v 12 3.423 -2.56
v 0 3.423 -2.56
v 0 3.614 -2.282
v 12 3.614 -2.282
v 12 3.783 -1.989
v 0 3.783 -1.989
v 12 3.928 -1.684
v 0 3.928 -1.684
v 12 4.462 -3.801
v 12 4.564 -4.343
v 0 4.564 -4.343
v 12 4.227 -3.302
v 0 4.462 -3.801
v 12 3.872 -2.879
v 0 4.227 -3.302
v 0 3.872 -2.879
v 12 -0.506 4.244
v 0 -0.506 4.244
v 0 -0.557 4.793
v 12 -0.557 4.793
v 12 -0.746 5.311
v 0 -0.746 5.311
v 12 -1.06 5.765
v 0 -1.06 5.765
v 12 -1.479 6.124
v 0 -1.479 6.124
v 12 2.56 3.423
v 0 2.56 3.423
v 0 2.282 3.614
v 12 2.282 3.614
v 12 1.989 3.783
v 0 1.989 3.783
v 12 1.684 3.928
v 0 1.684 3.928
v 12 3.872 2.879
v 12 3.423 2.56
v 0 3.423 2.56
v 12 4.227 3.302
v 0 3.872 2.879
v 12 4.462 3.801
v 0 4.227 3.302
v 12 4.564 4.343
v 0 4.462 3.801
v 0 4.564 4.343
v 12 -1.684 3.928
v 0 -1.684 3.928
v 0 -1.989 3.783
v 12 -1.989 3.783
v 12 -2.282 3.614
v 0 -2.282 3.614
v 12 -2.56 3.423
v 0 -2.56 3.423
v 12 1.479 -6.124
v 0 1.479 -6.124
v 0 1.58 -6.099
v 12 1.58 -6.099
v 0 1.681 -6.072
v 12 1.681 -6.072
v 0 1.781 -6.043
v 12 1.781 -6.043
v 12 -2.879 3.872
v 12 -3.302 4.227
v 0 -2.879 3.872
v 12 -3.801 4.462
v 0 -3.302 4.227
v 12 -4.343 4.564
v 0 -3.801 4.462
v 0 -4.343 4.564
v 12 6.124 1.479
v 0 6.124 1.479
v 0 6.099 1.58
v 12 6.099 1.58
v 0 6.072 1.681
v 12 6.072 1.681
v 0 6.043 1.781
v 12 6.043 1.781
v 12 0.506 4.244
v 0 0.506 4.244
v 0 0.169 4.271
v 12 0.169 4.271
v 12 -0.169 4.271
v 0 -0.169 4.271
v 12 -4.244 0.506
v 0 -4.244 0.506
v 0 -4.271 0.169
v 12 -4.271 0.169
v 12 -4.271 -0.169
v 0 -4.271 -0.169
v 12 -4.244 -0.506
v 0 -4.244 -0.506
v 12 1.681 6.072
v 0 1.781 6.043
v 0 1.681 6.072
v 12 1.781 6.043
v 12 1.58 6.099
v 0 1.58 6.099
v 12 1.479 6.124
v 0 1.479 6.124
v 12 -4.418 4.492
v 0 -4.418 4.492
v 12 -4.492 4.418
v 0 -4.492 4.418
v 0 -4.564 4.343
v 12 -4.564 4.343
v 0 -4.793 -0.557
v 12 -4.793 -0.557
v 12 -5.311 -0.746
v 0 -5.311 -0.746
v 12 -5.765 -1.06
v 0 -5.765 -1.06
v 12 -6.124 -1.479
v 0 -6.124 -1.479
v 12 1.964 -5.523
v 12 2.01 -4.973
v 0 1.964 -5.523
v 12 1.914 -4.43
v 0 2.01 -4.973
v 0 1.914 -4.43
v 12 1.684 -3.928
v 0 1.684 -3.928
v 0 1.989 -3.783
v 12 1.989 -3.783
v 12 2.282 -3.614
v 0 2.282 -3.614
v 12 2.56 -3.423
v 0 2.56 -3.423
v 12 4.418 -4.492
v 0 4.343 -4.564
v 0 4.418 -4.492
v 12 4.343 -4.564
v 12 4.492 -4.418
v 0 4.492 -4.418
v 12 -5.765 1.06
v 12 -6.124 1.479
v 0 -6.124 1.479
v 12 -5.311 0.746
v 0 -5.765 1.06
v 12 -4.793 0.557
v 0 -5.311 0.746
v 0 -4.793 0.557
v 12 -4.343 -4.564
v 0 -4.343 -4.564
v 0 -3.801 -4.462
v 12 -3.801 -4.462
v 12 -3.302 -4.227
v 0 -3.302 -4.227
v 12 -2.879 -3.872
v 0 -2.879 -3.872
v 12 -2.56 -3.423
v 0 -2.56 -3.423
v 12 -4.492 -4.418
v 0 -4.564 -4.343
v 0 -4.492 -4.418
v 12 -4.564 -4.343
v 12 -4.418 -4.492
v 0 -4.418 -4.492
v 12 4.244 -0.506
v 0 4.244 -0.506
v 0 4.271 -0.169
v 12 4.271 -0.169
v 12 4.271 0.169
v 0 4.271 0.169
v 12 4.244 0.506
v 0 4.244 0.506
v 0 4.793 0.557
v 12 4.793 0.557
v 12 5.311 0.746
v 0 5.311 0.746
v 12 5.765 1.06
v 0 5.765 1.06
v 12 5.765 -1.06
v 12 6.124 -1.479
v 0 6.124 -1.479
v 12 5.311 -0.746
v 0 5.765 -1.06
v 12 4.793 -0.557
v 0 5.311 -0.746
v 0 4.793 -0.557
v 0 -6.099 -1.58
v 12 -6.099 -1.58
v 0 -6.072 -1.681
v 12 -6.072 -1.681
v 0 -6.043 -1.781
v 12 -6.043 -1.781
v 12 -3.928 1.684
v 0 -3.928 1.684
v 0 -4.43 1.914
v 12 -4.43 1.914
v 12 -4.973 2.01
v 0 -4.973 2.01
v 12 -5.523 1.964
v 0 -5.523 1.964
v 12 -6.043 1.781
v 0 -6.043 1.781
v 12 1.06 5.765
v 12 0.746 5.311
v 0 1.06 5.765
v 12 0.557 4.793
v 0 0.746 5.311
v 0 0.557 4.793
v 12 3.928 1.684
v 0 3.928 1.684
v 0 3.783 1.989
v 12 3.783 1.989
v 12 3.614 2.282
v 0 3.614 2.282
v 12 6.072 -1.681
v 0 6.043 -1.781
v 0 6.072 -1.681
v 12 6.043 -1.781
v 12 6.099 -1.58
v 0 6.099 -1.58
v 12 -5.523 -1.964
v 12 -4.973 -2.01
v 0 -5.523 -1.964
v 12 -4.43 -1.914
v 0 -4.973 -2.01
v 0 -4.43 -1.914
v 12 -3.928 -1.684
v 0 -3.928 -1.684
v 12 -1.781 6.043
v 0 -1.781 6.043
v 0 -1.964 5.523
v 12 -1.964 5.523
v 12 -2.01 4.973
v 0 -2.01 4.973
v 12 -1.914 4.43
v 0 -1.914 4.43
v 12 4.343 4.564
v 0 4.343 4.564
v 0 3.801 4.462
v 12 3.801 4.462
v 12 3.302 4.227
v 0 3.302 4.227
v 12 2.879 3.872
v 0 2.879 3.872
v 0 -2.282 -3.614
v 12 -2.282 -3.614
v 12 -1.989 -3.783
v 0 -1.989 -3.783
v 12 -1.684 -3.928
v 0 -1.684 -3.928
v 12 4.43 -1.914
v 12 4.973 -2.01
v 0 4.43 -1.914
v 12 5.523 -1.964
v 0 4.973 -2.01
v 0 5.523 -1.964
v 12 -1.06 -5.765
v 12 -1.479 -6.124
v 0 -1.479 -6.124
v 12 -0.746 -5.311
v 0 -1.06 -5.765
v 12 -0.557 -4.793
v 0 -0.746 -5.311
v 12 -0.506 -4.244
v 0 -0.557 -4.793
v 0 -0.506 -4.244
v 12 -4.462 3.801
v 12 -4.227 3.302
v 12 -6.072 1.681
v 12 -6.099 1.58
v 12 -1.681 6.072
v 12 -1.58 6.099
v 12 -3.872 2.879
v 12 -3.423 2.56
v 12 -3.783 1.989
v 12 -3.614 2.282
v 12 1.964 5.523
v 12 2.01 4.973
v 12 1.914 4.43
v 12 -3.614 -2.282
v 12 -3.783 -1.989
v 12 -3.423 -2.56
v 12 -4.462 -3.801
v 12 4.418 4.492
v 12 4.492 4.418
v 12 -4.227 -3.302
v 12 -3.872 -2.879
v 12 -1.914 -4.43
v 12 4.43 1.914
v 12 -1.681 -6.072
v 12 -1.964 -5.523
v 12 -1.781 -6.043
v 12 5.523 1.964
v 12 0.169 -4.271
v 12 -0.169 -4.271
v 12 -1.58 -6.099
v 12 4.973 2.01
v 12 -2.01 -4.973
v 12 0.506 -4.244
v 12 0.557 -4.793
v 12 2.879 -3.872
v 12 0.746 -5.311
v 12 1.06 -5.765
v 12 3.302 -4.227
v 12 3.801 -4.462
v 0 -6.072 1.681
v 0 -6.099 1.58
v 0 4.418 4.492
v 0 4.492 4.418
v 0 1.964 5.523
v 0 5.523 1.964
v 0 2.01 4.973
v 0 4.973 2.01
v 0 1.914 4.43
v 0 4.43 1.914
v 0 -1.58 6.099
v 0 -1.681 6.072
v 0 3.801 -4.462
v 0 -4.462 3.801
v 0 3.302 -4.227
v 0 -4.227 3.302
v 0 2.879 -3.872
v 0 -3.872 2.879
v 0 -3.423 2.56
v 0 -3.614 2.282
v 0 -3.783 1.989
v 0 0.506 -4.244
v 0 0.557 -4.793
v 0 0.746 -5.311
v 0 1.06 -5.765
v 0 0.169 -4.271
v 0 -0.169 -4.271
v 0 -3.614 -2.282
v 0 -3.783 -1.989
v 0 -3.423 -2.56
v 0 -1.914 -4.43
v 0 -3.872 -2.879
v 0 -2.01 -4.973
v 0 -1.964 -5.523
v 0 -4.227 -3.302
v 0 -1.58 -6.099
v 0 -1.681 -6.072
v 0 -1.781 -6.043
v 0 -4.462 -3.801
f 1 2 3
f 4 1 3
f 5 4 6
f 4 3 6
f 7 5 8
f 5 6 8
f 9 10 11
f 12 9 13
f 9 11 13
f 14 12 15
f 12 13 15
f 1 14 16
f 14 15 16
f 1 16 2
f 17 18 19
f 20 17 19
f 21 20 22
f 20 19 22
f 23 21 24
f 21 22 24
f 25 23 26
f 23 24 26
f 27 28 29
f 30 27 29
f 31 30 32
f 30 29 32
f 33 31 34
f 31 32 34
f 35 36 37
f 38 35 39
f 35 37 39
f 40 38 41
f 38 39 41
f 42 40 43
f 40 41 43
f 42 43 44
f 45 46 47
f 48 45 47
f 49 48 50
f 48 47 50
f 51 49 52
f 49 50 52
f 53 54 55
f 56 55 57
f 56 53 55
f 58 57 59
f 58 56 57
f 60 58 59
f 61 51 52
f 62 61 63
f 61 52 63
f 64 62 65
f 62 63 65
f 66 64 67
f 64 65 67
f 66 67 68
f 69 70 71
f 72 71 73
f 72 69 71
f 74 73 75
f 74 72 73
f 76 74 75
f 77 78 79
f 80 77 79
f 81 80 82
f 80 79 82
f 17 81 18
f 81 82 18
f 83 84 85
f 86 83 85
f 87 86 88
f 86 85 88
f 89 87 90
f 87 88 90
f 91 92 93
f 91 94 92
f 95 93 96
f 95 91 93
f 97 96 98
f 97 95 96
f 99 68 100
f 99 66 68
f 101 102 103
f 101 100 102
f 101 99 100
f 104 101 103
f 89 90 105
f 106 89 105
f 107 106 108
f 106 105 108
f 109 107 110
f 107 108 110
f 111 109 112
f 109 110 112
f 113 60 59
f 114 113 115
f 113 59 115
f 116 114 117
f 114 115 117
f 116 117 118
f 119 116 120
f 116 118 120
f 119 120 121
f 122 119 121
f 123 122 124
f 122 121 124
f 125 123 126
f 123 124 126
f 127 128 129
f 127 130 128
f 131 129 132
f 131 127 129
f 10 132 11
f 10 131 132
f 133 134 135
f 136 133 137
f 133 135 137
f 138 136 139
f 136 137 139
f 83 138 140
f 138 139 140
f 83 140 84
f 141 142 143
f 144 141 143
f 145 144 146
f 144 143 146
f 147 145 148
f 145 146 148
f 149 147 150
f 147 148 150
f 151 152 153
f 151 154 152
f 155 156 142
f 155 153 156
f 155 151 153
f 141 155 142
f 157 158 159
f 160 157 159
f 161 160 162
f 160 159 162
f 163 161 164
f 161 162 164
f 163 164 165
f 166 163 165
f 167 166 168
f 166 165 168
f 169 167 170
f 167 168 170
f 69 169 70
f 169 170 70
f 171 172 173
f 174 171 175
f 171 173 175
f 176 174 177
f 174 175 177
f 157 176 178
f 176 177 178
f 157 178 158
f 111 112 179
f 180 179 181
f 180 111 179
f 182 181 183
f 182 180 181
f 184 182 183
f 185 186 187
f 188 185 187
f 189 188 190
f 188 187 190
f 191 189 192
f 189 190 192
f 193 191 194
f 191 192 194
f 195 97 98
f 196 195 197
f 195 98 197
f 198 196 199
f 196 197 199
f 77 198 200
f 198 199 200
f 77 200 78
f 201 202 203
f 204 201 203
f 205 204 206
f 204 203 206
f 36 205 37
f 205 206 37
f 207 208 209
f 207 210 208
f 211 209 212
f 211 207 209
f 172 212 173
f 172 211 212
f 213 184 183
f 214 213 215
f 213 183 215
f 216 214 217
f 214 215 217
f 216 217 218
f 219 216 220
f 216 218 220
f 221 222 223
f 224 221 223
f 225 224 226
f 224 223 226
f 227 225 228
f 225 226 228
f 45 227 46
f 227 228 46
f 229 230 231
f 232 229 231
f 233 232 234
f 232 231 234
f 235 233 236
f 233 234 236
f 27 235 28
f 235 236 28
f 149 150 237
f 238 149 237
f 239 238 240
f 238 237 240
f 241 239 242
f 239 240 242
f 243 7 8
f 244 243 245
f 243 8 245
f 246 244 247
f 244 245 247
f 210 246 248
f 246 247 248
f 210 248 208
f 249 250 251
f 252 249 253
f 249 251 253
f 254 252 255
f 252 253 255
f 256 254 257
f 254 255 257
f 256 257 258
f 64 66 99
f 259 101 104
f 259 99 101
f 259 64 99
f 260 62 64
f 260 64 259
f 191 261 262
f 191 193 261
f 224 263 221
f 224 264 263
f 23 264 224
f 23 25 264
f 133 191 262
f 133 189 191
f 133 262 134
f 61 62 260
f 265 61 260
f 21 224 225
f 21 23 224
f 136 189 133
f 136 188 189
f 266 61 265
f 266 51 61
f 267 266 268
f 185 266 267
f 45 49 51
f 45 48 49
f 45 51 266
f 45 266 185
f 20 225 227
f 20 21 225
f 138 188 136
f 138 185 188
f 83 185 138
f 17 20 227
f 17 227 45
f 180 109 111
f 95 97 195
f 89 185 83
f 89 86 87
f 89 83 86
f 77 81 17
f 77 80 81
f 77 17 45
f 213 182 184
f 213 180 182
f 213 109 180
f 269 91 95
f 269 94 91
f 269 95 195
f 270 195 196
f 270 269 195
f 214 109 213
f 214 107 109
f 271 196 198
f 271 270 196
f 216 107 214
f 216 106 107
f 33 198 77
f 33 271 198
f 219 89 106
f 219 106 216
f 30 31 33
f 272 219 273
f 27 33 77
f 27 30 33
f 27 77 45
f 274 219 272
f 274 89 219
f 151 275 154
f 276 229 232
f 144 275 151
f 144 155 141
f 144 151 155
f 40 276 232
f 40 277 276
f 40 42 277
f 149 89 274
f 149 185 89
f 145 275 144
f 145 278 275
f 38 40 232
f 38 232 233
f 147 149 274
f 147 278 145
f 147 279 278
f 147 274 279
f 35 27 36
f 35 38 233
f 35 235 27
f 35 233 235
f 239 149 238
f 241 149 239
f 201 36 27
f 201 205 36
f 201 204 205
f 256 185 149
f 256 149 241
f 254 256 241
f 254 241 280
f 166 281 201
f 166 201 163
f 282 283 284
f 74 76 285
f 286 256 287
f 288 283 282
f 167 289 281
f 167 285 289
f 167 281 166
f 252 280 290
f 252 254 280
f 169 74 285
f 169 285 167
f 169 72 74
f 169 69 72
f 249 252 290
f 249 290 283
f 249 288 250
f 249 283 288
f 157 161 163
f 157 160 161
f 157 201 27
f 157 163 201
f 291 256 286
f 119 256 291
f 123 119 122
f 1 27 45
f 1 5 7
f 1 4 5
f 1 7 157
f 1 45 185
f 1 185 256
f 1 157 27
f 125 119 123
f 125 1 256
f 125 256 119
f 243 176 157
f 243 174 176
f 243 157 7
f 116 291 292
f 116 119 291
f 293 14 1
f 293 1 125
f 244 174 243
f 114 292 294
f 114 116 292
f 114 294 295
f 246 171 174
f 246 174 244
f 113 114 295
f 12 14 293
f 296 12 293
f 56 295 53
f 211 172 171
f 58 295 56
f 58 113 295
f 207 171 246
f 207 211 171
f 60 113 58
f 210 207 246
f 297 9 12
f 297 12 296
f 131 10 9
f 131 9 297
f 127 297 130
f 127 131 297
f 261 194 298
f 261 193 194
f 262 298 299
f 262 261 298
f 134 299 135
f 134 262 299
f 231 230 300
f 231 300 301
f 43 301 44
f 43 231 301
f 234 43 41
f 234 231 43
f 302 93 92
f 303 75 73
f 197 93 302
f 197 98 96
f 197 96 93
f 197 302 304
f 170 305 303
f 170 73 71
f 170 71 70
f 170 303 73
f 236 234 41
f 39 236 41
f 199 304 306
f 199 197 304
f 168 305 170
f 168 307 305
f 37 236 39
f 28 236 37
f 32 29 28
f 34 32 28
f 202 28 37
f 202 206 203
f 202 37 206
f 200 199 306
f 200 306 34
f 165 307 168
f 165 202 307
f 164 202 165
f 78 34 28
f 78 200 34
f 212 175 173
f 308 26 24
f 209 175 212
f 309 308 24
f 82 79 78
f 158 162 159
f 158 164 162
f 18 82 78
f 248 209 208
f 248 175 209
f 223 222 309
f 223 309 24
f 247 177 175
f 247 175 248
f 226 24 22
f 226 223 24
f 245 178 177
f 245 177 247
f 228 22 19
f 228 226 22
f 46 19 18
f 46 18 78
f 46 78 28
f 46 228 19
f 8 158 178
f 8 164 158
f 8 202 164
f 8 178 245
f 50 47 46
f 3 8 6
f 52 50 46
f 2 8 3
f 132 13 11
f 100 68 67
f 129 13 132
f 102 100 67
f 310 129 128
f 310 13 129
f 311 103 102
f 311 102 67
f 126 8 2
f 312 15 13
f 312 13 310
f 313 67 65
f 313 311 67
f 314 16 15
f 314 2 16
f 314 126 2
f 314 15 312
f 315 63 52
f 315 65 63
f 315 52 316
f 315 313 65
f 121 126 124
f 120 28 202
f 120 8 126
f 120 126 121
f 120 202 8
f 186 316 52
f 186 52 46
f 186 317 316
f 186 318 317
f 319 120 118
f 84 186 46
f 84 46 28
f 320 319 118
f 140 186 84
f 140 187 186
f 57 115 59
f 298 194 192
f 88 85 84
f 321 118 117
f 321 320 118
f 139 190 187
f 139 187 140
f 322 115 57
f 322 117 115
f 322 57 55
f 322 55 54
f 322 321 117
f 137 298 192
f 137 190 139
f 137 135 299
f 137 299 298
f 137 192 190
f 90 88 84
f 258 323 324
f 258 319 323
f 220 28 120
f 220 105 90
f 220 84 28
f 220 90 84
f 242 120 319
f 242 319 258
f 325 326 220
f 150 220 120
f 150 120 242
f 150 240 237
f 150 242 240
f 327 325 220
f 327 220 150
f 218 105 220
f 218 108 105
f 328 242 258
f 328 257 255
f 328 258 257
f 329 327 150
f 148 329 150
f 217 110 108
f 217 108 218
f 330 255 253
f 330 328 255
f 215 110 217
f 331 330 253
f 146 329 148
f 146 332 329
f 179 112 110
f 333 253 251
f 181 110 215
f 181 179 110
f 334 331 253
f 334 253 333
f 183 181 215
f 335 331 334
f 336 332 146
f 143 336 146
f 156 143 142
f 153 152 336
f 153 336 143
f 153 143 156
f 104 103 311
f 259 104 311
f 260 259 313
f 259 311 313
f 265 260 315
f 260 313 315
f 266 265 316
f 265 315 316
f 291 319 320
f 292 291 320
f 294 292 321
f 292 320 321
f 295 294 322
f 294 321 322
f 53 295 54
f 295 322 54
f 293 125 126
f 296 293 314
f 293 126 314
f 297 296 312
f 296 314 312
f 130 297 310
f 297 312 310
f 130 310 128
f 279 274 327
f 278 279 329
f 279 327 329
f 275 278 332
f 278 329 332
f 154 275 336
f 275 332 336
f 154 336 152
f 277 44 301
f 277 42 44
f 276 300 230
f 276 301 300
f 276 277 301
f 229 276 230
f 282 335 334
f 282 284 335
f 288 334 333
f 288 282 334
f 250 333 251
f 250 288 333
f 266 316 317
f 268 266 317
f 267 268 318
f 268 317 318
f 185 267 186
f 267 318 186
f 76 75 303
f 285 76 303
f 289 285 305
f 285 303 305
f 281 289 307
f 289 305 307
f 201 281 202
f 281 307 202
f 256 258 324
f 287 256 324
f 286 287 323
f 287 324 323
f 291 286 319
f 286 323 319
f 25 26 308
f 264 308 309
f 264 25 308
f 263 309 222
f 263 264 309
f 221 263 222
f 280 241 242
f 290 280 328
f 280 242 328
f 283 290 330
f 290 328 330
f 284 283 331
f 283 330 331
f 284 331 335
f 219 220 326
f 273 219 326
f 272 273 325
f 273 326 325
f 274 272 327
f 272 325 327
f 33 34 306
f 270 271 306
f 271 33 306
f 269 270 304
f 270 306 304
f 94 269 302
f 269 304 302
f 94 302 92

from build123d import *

# Parameters (mm, degrees)
BASPROSKE_W         = 12
BASPROSKE_H         = 6.3
TOOTHCUT_DEPTH      = 15.945902448
TEETHCUTS_COUNT     = 12
TEETHCUTS_ANGLE     = 330
BORE_DEPTH          = 50.0000508
BOSS_EXTRUDE1_DEPTH = 12


with BuildPart() as part:
    # BasProSke → Base-Revolve (revolve)
    with BuildSketch(Plane(origin=(0, 0, 0), x_dir=(1, 0, 0), z_dir=(0, 1, 0)), mode=Mode.PRIVATE) as base_revolve_sk:
        with Locations((6, 3.15)):
            Rectangle(BASPROSKE_W, BASPROSKE_H)
    revolve(base_revolve_sk.sketch.rotate(Axis((-10, 0, 0), (1, 0, 0)), 180), axis=Axis((-10, 0, 0), (1, 0, 0)))

    # TooCutSke → ToothCut (cut, through all)
    with BuildSketch(Plane(origin=(0, 0, 0), x_dir=(0, 0, -1), z_dir=(1, 0, 0))):
        with BuildLine():
            ThreePointArc((0.505712998, 4.243975773), (0, 4.274), (-0.505712998, 4.243975773))
            ThreePointArc((-0.505712998, 4.243975773), (-0.754225381, 5.326869831), (-1.508135905, 6.142980649))
            ThreePointArc((-1.508135905, 6.142980649), (0, 6.3254), (1.508135905, 6.142980649))
            ThreePointArc((1.508135905, 6.142980649), (0.754225381, 5.326869831), (0.505712998, 4.243975773))
        make_face()
    toothcut = extrude(amount=TOOTHCUT_DEPTH, mode=Mode.SUBTRACT)

    # TeethCuts: ToothCut ×12 about axis
    teethcuts_axis = Axis((-10, 0, 0), (1, 0, 0))
    for i in range(1, TEETHCUTS_COUNT):
        add(toothcut.rotate(teethcuts_axis, i * TEETHCUTS_ANGLE / (TEETHCUTS_COUNT - 1)), mode=Mode.SUBTRACT)

    # BorSke → Bore (cut, symmetric)
    with BuildSketch(Plane(origin=(0, 0, 0), x_dir=(0, 0, -1), z_dir=(1, 0, 0))):
        with BuildLine():
            Line((-1.5, 2), (1.5, 2))
            ThreePointArc((1.5, 2), (0, -2.5), (-1.5, 2))
        make_face()
    extrude(amount=BORE_DEPTH, both=True, mode=Mode.SUBTRACT)

    # Sketch1 → Boss-Extrude1 (add)
    with BuildSketch(Plane(origin=(12, 0, 0), x_dir=(0, 0, -1), z_dir=(1, 0, 0))):
        with BuildLine():
            Line((1.5, 2), (-1.5, 2))
            ThreePointArc((-1.5, 2), (0, -2.5), (1.5, 2))
        make_face()
    extrude(amount=-BOSS_EXTRUDE1_DEPTH)


solid = part.part
